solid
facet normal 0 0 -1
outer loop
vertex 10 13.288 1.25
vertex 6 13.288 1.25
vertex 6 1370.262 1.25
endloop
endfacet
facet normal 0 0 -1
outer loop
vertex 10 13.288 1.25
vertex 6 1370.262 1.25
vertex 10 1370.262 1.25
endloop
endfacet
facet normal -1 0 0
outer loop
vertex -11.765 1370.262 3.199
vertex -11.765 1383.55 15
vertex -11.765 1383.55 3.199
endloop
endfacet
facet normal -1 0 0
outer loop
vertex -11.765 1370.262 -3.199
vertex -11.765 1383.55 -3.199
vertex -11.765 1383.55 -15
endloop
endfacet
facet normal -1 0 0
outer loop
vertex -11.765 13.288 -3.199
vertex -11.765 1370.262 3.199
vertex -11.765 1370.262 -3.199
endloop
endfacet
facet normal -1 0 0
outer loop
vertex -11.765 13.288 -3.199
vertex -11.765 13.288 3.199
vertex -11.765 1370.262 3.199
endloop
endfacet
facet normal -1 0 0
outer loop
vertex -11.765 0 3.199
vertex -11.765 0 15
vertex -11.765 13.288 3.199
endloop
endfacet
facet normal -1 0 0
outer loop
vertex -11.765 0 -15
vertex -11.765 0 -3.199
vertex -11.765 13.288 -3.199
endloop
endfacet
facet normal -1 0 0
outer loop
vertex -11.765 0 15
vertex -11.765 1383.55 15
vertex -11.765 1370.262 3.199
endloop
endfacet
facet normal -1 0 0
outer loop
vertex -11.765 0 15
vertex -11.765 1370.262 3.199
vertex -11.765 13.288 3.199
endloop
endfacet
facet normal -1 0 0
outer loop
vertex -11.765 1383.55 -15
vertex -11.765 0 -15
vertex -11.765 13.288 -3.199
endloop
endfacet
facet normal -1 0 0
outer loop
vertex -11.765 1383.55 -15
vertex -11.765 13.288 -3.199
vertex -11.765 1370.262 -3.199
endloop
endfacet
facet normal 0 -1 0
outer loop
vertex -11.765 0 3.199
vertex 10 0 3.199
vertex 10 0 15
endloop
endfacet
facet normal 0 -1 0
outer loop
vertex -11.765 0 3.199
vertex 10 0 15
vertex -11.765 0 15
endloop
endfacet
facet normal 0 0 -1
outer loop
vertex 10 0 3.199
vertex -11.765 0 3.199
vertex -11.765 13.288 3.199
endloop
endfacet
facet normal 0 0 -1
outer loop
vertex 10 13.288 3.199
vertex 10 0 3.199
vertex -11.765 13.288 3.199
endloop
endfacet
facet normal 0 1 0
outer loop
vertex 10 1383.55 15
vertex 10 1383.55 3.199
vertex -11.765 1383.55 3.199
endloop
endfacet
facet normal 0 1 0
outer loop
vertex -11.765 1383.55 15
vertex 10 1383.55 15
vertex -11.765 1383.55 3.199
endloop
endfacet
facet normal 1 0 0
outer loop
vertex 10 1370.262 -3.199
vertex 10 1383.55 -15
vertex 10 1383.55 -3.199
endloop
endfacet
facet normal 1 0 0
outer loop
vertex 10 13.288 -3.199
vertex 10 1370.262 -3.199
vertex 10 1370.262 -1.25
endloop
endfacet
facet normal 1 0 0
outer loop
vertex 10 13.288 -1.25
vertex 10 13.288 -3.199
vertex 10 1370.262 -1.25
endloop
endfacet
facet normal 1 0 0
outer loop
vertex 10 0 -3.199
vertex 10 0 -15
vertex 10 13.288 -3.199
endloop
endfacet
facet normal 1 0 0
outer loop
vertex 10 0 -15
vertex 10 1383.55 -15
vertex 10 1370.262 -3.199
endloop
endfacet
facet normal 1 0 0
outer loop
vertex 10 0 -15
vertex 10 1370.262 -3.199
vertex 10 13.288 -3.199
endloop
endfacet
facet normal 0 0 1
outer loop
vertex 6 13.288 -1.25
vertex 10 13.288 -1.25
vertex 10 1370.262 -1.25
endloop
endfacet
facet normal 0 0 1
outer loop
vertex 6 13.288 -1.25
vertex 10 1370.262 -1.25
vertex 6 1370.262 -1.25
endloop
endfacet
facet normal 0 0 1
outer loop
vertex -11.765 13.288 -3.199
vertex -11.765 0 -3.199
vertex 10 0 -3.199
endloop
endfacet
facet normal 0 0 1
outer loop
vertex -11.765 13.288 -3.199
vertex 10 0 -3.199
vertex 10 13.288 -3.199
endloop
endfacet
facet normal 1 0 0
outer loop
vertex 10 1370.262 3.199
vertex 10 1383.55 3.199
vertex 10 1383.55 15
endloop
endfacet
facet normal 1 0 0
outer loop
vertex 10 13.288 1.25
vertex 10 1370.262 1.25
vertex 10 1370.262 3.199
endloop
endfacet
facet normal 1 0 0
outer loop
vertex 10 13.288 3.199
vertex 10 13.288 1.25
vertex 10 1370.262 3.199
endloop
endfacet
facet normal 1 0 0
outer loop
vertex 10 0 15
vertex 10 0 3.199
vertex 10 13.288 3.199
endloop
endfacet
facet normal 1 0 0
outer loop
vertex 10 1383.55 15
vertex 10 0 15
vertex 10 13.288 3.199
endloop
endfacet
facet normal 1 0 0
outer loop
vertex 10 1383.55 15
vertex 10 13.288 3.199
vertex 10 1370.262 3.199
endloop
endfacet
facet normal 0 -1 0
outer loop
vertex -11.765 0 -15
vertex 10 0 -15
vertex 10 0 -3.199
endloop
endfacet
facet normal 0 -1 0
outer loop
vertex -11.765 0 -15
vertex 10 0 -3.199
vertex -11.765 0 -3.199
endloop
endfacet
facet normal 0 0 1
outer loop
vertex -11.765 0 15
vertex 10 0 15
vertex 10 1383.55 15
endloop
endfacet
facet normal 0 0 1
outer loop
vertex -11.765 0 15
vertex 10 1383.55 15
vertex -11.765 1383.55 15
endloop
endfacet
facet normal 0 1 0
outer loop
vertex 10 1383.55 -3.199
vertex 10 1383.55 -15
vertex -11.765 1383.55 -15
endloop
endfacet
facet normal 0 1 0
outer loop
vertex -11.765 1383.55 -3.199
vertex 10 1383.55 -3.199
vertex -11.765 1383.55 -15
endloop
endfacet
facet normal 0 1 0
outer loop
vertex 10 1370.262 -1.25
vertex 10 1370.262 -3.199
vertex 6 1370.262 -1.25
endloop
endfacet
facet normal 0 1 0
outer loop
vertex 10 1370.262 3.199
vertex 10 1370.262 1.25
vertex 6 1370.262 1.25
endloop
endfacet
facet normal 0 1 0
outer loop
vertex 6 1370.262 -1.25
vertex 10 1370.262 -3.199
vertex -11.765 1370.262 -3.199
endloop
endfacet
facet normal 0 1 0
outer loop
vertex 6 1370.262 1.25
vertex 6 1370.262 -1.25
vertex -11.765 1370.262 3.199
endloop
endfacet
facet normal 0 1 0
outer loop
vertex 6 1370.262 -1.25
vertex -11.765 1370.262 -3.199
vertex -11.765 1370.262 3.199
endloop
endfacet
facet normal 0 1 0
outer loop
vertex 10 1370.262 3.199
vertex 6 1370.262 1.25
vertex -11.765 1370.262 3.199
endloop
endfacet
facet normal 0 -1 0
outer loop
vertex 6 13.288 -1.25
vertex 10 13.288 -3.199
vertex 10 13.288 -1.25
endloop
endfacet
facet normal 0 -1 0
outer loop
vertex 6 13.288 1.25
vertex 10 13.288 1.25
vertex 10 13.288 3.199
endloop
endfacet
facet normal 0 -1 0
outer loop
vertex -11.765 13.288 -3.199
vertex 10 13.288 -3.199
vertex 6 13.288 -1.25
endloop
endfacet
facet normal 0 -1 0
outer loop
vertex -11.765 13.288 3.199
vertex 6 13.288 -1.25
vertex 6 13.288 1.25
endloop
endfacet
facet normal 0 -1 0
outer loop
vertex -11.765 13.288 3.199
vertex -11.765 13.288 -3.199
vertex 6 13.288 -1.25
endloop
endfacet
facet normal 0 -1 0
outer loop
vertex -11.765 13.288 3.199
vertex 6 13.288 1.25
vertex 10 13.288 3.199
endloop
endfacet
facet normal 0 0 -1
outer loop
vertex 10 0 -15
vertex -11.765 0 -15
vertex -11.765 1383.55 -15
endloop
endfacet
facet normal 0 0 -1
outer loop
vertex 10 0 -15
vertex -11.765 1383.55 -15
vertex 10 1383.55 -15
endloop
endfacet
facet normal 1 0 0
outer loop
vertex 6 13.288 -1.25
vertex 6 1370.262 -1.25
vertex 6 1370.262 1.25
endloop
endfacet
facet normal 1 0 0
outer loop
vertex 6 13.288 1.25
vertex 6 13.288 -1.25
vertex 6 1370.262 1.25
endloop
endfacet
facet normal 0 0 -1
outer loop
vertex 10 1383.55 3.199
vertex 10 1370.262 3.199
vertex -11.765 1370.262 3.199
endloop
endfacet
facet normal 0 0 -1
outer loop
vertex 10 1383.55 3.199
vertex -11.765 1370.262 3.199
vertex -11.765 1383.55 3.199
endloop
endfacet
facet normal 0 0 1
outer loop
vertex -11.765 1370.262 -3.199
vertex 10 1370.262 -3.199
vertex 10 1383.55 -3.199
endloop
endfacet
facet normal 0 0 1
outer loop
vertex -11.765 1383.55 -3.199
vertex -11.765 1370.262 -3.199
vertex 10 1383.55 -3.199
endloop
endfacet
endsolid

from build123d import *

# Parameters (mm, degrees)
EXTRUDE_1_DEPTH     = 1383.55
SKETCH_2_W          = 6.397518836
SKETCH_2_H          = 13.287823591
CUT_EXTRUDE_1_DEPTH = 22.764865627


with BuildPart() as part:
    # Эскиз1 → Бобышка-Вытянуть1 (new body)
    with BuildSketch(Plane(origin=(0, 0, 0), x_dir=(1, 0, 0), z_dir=(0, 1, 0))):
        Polygon((-11.764865627, 15), (10, 15), (10, 1.25), (6, 1.25), (6, -1.25), (10, -1.25), (10, -15), (-11.764865627, -15), align=None)
    extrude(amount=EXTRUDE_1_DEPTH)

    # Эскиз2 → Вырез-Вытянуть1 (cut, through all)
    with BuildSketch(Plane.ZY.offset(11.764865627)):
        with Locations((0, 6.643911796)):
            Rectangle(SKETCH_2_W, SKETCH_2_H)
        with Locations((0, 1376.906088205)):
            Rectangle(SKETCH_2_W, SKETCH_2_H)
    extrude(amount=-CUT_EXTRUDE_1_DEPTH, mode=Mode.SUBTRACT)


solid = part.part
